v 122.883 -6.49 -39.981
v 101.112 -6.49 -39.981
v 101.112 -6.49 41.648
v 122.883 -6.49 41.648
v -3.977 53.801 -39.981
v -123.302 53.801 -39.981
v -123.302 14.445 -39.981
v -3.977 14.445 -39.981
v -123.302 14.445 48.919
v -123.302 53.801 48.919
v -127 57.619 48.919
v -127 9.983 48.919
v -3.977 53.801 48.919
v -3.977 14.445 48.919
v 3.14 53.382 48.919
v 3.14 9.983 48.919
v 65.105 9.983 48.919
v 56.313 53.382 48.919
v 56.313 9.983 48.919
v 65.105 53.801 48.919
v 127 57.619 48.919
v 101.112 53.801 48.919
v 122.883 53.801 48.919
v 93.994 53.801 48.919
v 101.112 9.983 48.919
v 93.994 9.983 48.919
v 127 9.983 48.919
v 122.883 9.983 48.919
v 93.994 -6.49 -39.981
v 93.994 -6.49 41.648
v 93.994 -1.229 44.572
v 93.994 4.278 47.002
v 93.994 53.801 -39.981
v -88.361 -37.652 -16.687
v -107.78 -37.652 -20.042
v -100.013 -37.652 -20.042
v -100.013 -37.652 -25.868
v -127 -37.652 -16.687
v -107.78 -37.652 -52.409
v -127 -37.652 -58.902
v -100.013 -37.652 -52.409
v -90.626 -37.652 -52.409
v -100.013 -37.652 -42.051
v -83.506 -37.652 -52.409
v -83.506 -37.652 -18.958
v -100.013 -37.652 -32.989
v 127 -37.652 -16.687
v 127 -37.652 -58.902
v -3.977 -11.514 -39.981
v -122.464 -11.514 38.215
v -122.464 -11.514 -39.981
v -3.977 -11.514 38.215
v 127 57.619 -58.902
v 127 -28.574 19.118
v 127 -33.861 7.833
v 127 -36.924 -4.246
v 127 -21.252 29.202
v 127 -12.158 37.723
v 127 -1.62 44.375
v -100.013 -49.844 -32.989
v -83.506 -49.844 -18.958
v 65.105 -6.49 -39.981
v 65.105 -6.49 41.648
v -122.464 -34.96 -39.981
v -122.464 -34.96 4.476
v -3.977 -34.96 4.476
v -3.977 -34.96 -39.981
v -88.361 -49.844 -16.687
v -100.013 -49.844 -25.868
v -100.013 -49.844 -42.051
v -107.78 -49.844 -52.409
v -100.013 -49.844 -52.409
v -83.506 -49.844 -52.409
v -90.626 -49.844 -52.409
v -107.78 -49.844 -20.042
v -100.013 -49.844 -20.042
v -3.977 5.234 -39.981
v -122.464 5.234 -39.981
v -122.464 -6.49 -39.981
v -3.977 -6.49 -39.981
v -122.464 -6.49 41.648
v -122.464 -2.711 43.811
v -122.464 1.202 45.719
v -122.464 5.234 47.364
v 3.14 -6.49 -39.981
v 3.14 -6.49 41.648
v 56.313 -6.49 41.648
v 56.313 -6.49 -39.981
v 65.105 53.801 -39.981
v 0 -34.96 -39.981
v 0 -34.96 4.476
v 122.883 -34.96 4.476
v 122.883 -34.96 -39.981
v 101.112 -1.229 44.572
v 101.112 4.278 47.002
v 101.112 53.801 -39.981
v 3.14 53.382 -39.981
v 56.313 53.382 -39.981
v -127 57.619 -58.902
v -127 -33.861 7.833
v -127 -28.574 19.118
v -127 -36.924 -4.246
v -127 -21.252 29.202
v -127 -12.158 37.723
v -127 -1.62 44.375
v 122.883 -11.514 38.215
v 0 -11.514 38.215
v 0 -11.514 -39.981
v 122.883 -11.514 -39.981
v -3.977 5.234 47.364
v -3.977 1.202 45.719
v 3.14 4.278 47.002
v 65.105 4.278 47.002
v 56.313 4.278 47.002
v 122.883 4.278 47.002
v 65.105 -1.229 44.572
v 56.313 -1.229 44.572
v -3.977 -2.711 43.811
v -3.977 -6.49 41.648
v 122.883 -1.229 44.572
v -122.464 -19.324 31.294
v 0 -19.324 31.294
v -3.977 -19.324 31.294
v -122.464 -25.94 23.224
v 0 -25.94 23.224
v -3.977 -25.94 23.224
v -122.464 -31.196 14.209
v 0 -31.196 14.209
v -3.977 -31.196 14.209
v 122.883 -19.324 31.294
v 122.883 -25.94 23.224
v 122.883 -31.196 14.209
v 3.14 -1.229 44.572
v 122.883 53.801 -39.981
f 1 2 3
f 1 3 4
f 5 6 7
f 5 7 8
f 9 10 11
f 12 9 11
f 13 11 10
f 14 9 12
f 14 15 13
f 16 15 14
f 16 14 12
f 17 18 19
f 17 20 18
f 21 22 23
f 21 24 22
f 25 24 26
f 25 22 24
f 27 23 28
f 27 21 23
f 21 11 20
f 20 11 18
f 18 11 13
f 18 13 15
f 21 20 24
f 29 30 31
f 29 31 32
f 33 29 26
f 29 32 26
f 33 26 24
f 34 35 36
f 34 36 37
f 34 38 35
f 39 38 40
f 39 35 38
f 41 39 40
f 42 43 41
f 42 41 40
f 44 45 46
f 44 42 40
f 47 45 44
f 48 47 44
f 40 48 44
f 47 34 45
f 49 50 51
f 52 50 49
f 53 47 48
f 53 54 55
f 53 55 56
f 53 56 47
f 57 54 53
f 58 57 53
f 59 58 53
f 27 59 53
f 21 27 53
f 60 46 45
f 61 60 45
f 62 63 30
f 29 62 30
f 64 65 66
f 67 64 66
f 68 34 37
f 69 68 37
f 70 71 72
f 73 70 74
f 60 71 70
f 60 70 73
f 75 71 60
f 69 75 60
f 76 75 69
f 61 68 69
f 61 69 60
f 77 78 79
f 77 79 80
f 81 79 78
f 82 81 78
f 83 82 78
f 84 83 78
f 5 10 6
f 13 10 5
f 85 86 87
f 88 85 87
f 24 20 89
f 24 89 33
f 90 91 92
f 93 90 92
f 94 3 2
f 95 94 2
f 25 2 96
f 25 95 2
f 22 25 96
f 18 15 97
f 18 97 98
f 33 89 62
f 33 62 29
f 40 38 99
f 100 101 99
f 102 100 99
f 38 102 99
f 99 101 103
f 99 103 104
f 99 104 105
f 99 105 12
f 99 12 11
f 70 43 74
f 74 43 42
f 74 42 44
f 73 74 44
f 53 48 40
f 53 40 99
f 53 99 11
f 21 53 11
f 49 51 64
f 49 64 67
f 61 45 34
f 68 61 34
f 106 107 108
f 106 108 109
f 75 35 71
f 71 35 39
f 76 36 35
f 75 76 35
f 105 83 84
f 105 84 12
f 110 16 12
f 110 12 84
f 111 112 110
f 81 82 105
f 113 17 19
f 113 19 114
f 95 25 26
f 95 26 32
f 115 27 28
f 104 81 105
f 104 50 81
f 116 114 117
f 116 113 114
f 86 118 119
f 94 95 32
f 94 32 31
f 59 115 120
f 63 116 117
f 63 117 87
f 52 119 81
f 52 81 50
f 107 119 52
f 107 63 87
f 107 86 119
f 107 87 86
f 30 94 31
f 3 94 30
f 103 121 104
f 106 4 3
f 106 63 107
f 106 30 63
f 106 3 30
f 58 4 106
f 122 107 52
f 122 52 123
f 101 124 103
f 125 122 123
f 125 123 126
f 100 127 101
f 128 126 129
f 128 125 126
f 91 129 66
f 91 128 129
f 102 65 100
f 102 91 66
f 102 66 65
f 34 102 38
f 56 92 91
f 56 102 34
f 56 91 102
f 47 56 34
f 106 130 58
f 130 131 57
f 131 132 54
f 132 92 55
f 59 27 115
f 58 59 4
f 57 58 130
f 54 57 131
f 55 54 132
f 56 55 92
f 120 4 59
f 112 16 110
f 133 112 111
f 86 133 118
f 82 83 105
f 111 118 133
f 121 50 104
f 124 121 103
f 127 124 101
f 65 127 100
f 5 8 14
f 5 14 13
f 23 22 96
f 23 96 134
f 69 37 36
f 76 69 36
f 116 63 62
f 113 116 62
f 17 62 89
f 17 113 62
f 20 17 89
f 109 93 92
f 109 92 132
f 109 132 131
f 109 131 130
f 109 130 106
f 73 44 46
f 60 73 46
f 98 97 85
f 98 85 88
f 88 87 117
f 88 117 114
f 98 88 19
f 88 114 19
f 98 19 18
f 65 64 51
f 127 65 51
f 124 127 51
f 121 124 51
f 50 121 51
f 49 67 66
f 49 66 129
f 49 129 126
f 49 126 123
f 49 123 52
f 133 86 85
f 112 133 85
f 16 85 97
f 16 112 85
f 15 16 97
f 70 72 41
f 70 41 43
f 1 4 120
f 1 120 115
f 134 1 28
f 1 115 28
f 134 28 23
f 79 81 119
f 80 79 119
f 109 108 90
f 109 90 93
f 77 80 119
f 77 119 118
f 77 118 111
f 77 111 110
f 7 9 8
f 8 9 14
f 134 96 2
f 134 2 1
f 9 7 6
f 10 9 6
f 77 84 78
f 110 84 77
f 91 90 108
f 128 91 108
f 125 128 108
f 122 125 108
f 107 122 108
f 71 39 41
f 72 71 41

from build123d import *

# Parameters (mm, degrees)
F1_DEPTH = 127
F2_W     = 119.324183
F2_H     = 39.356043
F2_W_2   = 118.48682
F2_H_2   = 11.723077
F2_H_3   = 23.446153
F2_W_3   = 122.88297
F2_W_4   = 21.771431
F2_H_4   = 60.29011
F2_W_5   = 28.889016
F2_W_6   = 53.172529
F2_H_5   = 59.871432
F3_DEPTH = 88.9
F5_DEPTH = 12.192


with BuildPart() as f1:
    # F0 (on Right) → F1 (new body, symmetric)
    with BuildSketch(Plane.YZ):
        with BuildLine():
            Line((-37.651766, -16.686577), (-37.651766, -58.902193))
            Line((-37.651766, -58.902193), (57.618611, -58.902193))
            Line((57.618611, -58.902193), (57.618611, 48.918769))
            Line((57.618611, 48.918769), (9.983422, 48.918769))
            ThreePointArc((9.983422, 48.918769), (-25.152108, 24.333902), (-37.651766, -16.686577))
        make_face()
    extrude(amount=F1_DEPTH, both=True)

    # F2 (on face) → F3 (cut)
    with BuildSketch(Plane.XY.offset(48.918769)):
        with Locations((-63.639564, 34.122527)):
            Rectangle(F2_W, F2_H)
        with Locations((-63.220882, -0.628023)):
            Rectangle(F2_W_2, F2_H_2)
        with Locations((-63.220882, -23.236814)):
            Rectangle(F2_W_2, F2_H_3)
        with Locations((61.441485, -23.236814)):
            Rectangle(F2_W_3, F2_H_3)
        with Locations((111.997254, 23.655494)):
            Rectangle(F2_W_4, F2_H_4)
        with Locations((79.549454, 23.655494)):
            Rectangle(F2_W_5, F2_H_4)
        with Locations((29.726374, 23.446155)):
            Rectangle(F2_W_6, F2_H_5)
    extrude(amount=-F3_DEPTH, mode=Mode.SUBTRACT)

    # F4 (on face) → F5 (join)
    with BuildSketch(Plane.XZ.offset(37.651766)):
        Polygon((-100.012504, -20.042138), (-107.780464, -20.042138), (-107.780464, -52.408643), (-100.012504, -52.408643), (-100.012504, -42.05136), (-90.626217, -52.408643), (-83.505586, -52.408643), (-100.012504, -32.988738), (-83.505586, -18.957859), (-88.360563, -16.686577), (-100.012504, -25.868108), align=None)
    extrude(amount=F5_DEPTH)


solid = f1.part
